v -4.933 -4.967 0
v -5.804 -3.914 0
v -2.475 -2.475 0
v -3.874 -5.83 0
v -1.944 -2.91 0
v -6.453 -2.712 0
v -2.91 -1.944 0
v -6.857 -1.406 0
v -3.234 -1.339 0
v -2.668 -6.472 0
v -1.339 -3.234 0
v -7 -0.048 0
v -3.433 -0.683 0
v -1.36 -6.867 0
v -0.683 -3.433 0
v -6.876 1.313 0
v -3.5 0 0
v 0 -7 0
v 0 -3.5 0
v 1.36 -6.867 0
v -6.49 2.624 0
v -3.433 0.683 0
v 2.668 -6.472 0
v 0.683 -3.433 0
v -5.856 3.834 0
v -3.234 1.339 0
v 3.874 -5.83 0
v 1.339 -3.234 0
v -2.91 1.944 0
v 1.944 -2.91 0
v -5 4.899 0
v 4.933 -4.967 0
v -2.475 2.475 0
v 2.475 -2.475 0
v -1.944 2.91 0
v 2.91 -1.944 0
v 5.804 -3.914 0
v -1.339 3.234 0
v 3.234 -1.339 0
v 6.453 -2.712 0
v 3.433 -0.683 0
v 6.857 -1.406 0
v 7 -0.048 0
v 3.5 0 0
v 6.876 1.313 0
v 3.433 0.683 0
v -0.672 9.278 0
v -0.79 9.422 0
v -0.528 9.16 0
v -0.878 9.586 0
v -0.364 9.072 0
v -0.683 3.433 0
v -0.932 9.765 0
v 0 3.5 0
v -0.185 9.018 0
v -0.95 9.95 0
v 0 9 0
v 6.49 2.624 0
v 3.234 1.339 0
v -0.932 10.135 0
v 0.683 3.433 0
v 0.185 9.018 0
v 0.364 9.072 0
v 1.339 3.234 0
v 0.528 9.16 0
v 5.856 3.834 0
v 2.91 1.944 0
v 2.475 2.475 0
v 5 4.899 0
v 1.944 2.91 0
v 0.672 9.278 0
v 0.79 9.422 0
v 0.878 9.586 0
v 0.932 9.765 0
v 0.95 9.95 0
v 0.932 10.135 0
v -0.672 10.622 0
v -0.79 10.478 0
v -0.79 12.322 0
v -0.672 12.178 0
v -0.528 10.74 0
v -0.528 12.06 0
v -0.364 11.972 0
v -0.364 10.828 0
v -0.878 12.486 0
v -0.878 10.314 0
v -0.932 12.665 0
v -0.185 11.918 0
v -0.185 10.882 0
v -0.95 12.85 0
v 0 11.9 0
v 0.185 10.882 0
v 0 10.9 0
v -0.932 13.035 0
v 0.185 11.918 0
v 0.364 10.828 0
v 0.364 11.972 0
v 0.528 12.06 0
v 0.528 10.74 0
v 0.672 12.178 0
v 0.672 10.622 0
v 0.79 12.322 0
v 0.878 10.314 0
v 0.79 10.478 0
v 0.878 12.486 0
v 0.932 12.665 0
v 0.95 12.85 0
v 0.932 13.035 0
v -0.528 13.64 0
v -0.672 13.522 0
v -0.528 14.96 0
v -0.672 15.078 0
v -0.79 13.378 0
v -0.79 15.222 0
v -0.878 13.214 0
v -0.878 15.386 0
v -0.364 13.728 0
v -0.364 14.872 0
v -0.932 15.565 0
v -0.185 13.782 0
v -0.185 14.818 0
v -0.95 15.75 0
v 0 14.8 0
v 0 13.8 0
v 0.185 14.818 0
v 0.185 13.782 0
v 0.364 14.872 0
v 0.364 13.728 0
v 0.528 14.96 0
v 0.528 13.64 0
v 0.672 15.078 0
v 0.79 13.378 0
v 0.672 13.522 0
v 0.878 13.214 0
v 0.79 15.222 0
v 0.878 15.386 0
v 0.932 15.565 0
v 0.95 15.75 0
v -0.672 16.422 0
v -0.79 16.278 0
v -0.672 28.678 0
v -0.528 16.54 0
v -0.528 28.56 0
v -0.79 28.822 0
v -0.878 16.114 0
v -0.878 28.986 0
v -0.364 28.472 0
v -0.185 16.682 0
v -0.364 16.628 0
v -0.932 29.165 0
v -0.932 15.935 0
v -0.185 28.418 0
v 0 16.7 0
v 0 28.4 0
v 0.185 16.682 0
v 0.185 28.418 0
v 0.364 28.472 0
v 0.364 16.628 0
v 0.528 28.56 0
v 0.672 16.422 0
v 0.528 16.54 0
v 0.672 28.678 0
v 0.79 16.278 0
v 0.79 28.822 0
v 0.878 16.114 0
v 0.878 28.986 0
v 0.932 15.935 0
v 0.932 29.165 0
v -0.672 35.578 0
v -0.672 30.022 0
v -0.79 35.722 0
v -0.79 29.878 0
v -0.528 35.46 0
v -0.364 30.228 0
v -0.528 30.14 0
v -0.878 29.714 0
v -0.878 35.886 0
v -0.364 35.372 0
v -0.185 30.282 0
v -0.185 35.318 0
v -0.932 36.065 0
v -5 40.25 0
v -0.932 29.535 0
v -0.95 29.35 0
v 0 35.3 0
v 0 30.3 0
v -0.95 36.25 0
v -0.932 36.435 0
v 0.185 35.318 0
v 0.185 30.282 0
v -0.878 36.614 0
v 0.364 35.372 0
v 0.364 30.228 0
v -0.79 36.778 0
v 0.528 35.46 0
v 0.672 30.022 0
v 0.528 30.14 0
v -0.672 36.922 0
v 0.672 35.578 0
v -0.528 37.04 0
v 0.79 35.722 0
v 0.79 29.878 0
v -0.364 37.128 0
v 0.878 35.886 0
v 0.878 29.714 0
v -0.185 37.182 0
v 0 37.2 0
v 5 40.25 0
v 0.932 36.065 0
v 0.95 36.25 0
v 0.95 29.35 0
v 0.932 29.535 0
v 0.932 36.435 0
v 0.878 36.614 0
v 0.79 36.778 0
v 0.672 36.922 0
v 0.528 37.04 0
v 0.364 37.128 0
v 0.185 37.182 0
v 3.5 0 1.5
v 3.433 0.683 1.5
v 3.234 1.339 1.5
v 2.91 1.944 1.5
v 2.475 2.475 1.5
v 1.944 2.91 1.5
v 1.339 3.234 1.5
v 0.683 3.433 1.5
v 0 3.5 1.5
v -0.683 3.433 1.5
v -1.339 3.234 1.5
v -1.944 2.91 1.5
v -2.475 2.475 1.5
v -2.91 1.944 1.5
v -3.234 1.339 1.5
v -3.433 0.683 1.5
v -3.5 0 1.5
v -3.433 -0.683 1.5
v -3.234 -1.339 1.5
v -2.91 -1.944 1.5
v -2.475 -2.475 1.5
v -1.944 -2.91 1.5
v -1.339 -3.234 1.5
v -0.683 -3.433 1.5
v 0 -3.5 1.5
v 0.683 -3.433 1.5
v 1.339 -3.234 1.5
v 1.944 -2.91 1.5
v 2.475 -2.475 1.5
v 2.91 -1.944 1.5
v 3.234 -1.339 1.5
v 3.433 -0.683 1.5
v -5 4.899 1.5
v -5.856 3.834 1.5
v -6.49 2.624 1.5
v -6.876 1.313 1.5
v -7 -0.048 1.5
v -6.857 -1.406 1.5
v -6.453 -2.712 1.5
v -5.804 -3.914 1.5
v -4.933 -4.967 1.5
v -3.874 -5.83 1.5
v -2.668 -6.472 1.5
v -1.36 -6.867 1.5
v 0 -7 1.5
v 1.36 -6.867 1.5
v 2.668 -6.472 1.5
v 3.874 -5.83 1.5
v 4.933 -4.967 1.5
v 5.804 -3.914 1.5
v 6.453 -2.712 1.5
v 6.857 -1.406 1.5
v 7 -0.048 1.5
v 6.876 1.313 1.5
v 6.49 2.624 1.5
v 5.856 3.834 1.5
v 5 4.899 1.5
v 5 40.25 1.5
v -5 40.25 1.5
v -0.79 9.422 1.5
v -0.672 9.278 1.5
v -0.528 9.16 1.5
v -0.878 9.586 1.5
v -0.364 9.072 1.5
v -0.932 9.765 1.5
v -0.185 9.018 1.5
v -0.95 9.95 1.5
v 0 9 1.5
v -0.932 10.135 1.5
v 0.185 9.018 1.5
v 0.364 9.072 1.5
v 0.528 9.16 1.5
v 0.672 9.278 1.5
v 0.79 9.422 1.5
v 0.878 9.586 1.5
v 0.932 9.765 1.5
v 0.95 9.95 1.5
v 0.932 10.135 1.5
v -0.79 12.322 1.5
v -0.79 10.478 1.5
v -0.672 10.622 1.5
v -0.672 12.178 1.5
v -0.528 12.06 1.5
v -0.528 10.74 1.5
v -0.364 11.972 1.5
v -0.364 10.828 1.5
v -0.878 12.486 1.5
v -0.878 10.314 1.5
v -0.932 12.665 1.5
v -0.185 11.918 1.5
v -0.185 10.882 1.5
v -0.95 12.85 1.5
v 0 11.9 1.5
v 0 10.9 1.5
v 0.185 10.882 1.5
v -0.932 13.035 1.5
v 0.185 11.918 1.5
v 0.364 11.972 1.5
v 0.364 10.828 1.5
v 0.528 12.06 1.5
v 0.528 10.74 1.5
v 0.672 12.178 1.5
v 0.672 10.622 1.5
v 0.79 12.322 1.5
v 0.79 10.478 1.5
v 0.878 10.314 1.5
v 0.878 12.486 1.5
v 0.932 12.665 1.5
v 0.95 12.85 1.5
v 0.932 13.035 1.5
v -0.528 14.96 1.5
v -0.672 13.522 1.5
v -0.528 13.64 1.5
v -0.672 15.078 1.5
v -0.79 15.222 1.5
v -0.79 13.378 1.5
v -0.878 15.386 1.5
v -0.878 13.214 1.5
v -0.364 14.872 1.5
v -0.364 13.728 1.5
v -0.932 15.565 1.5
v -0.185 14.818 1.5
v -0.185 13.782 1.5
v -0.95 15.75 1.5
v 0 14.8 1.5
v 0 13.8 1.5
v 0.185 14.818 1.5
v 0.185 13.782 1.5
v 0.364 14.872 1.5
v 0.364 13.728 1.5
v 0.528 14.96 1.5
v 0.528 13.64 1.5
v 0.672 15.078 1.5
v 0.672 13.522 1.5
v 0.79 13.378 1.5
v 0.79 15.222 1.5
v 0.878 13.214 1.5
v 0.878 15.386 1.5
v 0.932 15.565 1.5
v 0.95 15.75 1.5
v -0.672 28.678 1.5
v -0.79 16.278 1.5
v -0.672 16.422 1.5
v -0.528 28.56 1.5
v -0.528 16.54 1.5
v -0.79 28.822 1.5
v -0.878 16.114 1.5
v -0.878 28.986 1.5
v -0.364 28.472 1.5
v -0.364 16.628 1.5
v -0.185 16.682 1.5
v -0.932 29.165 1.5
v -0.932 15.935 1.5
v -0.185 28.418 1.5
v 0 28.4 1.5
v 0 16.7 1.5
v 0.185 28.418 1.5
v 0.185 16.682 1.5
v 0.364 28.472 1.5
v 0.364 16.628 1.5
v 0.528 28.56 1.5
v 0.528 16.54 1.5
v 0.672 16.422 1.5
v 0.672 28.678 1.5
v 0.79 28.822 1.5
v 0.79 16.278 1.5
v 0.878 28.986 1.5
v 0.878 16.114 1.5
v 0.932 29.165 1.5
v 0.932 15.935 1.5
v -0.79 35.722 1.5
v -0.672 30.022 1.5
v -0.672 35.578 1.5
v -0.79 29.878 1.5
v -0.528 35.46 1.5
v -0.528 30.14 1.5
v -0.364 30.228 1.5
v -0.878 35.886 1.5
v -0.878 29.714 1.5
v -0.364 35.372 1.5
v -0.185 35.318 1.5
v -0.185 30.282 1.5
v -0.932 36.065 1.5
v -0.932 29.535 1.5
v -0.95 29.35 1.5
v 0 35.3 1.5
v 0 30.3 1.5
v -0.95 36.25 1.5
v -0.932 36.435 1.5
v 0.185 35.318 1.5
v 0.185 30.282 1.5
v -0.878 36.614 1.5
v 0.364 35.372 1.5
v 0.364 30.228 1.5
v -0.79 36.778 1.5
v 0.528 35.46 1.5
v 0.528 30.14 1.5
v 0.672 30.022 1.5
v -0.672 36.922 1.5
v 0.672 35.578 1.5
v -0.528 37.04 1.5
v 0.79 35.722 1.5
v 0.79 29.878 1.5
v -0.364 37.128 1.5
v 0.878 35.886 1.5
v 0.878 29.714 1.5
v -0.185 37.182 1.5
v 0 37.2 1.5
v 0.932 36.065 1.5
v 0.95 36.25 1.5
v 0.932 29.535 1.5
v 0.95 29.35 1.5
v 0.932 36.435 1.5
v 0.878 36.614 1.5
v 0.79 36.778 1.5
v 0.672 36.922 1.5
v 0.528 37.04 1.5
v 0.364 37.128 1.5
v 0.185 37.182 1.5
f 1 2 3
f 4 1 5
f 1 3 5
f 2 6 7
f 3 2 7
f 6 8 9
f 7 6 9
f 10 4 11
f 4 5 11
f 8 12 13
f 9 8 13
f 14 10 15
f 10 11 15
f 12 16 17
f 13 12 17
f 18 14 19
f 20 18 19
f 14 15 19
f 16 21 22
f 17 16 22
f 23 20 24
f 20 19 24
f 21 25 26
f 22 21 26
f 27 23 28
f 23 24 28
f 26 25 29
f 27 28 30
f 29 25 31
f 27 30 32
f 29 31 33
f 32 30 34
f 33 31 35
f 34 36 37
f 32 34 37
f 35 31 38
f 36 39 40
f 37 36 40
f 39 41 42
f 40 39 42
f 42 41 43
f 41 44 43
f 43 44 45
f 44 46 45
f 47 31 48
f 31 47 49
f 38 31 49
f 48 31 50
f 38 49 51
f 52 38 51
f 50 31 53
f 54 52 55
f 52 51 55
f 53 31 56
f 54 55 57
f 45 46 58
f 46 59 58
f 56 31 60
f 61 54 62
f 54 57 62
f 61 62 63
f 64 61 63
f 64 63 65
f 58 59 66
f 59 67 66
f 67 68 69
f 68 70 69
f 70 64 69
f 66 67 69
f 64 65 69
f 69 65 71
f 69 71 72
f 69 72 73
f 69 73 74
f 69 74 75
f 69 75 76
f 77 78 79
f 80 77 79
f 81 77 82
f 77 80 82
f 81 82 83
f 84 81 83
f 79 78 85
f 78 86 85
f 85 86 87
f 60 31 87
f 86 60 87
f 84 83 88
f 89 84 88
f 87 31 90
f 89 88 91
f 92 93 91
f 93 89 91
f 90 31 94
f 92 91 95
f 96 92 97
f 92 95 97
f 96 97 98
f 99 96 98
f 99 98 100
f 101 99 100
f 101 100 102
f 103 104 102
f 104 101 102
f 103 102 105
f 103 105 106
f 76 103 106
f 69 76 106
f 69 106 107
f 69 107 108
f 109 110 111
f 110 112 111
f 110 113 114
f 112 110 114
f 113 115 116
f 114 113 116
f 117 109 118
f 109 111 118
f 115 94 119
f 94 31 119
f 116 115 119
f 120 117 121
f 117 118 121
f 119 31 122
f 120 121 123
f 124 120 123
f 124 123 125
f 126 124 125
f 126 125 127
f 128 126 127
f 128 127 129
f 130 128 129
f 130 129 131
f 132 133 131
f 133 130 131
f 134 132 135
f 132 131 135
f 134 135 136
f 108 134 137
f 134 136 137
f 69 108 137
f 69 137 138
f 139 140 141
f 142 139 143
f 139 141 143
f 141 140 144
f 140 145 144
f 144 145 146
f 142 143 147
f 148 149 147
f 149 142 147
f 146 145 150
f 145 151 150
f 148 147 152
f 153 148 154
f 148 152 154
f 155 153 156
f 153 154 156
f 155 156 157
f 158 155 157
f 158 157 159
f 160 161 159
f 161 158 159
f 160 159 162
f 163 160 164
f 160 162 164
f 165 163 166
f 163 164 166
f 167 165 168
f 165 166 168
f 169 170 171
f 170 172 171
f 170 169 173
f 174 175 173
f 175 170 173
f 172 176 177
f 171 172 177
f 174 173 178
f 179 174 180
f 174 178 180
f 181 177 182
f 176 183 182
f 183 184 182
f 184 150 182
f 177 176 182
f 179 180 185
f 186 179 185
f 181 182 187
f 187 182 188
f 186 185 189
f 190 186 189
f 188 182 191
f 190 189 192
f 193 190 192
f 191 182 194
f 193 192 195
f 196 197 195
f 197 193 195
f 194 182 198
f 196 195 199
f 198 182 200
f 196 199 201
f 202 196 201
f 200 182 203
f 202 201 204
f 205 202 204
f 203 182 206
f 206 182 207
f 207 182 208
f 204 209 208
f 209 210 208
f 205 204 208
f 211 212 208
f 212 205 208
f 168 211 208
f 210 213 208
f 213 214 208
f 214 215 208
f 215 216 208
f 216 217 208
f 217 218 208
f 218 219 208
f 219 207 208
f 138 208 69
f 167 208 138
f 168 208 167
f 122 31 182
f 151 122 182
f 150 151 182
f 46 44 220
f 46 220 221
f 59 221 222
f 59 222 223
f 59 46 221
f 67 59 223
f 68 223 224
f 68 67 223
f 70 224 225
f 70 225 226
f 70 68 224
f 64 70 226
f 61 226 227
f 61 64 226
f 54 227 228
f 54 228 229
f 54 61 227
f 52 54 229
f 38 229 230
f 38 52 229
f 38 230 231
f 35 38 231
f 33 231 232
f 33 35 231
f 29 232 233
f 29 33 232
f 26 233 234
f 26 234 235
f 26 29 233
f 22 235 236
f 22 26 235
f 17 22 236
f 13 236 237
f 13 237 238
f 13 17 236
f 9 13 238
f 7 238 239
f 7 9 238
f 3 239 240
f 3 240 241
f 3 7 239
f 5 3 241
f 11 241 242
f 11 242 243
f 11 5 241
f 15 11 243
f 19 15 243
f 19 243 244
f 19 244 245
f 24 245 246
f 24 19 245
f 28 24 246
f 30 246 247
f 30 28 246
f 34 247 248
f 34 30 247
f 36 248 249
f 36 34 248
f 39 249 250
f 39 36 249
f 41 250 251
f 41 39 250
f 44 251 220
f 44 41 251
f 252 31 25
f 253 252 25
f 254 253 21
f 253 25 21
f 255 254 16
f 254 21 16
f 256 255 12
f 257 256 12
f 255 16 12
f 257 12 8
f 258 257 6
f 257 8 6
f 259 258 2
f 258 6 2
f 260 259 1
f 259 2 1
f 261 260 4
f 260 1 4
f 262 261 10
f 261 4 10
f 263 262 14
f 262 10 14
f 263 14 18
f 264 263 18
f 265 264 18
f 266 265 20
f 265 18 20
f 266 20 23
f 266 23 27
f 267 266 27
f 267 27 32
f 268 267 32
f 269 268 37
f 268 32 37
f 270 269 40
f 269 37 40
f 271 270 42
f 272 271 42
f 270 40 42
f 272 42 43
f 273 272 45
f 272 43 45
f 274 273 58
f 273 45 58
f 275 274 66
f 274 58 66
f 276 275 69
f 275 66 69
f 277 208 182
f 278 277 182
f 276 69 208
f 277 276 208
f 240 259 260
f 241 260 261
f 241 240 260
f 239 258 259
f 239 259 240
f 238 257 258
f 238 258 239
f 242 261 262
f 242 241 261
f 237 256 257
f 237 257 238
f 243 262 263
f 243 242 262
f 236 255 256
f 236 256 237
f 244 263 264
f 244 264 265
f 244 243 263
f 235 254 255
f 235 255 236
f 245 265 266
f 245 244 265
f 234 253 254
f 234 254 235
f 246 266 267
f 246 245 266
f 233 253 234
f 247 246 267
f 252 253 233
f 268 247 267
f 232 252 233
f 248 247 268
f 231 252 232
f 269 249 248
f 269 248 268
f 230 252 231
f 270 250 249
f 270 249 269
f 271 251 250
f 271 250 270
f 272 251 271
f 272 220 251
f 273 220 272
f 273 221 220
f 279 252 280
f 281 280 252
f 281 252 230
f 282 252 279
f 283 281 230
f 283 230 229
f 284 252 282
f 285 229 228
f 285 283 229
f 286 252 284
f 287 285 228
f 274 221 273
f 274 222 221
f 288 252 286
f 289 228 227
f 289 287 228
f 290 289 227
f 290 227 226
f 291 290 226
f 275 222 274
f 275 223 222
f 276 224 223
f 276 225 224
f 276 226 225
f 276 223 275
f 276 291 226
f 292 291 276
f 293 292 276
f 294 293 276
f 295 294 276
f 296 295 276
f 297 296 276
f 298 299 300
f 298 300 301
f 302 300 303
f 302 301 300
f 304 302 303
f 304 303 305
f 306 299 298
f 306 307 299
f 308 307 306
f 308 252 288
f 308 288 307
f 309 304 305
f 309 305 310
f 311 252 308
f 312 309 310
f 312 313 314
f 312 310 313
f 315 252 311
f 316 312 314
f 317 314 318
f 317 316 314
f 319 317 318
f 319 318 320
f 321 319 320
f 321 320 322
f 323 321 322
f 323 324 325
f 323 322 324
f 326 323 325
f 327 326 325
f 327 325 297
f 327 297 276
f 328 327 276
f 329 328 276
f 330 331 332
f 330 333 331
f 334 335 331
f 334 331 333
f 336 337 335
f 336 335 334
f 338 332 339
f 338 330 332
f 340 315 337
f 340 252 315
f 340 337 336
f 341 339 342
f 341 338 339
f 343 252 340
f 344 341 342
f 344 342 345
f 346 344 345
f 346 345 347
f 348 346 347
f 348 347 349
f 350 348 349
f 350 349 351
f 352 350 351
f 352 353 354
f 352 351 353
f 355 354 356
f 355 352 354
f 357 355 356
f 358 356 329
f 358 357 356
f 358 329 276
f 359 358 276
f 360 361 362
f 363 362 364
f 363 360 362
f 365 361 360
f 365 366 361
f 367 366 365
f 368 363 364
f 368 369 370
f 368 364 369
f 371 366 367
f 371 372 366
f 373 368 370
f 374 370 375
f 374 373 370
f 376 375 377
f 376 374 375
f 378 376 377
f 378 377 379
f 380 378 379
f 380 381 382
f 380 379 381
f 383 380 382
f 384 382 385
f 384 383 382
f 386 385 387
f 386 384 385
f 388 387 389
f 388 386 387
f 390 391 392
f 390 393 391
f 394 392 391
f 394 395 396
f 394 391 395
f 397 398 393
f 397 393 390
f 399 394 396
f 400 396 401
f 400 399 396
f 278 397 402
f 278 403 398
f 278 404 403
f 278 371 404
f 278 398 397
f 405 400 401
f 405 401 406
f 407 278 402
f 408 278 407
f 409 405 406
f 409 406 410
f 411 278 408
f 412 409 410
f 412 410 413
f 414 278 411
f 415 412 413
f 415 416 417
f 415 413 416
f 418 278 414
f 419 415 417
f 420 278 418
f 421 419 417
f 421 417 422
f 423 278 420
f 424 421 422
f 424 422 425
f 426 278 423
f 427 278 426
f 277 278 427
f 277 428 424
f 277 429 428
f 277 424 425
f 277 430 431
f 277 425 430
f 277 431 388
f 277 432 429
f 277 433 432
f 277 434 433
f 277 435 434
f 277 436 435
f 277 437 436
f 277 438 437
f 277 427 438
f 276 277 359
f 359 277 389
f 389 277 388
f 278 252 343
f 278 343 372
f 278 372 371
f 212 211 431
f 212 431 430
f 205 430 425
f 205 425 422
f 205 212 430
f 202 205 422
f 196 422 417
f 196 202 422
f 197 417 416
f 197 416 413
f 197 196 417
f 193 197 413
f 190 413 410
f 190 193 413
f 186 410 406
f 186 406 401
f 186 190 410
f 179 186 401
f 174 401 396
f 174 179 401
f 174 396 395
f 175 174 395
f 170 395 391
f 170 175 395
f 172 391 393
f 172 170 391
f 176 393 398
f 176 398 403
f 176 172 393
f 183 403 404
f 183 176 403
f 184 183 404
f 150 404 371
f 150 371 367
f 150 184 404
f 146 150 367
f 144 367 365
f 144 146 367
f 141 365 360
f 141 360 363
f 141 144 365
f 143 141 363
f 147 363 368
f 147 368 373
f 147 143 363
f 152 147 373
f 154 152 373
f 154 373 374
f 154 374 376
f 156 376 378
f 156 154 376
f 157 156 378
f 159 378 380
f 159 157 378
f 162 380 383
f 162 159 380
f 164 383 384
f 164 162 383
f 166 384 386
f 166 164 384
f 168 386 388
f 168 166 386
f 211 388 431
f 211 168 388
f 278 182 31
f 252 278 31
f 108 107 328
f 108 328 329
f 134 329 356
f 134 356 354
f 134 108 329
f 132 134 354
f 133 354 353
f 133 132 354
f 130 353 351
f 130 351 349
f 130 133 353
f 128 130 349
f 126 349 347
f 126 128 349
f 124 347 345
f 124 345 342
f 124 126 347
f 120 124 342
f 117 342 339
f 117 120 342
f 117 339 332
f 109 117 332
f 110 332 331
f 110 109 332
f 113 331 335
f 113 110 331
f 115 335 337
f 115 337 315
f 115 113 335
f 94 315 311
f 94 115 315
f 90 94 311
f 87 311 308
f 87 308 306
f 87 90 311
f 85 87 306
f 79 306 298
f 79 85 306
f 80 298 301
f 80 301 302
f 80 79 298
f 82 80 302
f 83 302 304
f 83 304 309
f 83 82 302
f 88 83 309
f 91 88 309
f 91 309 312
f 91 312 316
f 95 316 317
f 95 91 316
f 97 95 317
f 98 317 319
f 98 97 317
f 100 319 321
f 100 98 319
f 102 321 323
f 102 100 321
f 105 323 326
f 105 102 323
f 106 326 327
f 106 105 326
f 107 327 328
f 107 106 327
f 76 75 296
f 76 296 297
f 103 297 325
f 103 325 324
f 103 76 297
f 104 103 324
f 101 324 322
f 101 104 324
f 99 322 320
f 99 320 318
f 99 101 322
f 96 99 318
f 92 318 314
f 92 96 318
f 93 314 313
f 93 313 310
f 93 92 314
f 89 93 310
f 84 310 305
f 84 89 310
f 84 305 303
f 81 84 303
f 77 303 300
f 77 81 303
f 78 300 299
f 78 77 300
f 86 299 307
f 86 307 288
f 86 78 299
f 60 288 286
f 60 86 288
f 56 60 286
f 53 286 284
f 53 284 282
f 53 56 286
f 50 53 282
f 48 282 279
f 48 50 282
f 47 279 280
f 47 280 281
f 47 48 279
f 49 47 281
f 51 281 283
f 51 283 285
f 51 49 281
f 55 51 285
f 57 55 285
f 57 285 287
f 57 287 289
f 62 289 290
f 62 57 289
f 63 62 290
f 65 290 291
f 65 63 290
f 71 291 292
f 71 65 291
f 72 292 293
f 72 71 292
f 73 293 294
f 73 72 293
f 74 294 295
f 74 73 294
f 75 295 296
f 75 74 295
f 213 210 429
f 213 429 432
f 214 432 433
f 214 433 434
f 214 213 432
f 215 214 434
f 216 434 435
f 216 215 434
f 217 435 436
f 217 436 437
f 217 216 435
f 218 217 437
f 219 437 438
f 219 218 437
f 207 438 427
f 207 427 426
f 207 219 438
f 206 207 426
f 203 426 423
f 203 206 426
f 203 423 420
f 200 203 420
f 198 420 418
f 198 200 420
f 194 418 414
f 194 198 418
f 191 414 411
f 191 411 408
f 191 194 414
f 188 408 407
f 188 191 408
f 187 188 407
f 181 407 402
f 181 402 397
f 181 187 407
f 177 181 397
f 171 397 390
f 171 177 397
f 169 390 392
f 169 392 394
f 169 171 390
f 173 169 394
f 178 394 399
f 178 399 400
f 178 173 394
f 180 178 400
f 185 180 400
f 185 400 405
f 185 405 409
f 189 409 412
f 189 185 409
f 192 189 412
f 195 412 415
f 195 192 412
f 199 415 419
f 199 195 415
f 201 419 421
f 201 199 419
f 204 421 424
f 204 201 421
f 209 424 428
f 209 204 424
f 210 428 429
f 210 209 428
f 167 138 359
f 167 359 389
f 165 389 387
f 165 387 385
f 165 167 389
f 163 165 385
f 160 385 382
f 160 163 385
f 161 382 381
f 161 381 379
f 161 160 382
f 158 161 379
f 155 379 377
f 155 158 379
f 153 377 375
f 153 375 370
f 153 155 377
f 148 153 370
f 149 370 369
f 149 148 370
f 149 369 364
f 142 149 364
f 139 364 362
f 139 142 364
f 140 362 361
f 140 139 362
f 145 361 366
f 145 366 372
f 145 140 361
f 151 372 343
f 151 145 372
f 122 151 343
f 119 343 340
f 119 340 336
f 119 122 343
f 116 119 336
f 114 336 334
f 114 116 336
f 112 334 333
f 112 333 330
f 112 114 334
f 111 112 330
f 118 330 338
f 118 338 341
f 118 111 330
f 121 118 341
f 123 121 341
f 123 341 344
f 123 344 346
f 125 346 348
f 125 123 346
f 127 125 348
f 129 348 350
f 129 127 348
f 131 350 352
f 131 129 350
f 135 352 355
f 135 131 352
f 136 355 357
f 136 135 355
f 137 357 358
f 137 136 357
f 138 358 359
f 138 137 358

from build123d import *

# Parameters (mm, degrees)
SKETCH_1_R      = 3.5
SKETCH_1_R_2    = 0.95
EXTRUDE_2_DEPTH = 1.5


with BuildPart() as part:
    # 草图1 → 凸台-拉伸2 (new body)
    with BuildSketch(Plane.XY):
        with BuildLine():
            ThreePointArc((-5, 4.898979486), (0, -7), (5, 4.898979486))
            Line((5, 4.898979486), (5, 40.25))
            Line((5, 40.25), (-5, 40.25))
            Line((-5, 40.25), (-5, 4.898979486))
        make_face()
        Circle(SKETCH_1_R, mode=Mode.SUBTRACT)
        with Locations((0, 36.25)):
            Circle(SKETCH_1_R_2, mode=Mode.SUBTRACT)
        with Locations((0, 9.95)):
            Circle(SKETCH_1_R_2, mode=Mode.SUBTRACT)
        with Locations((0, 12.85)):
            Circle(SKETCH_1_R_2, mode=Mode.SUBTRACT)
        with Locations((0, 15.75)):
            Circle(SKETCH_1_R_2, mode=Mode.SUBTRACT)
        with Locations((0, 29.35)):
            Circle(SKETCH_1_R_2, mode=Mode.SUBTRACT)
    extrude(amount=EXTRUDE_2_DEPTH)


solid = part.part
